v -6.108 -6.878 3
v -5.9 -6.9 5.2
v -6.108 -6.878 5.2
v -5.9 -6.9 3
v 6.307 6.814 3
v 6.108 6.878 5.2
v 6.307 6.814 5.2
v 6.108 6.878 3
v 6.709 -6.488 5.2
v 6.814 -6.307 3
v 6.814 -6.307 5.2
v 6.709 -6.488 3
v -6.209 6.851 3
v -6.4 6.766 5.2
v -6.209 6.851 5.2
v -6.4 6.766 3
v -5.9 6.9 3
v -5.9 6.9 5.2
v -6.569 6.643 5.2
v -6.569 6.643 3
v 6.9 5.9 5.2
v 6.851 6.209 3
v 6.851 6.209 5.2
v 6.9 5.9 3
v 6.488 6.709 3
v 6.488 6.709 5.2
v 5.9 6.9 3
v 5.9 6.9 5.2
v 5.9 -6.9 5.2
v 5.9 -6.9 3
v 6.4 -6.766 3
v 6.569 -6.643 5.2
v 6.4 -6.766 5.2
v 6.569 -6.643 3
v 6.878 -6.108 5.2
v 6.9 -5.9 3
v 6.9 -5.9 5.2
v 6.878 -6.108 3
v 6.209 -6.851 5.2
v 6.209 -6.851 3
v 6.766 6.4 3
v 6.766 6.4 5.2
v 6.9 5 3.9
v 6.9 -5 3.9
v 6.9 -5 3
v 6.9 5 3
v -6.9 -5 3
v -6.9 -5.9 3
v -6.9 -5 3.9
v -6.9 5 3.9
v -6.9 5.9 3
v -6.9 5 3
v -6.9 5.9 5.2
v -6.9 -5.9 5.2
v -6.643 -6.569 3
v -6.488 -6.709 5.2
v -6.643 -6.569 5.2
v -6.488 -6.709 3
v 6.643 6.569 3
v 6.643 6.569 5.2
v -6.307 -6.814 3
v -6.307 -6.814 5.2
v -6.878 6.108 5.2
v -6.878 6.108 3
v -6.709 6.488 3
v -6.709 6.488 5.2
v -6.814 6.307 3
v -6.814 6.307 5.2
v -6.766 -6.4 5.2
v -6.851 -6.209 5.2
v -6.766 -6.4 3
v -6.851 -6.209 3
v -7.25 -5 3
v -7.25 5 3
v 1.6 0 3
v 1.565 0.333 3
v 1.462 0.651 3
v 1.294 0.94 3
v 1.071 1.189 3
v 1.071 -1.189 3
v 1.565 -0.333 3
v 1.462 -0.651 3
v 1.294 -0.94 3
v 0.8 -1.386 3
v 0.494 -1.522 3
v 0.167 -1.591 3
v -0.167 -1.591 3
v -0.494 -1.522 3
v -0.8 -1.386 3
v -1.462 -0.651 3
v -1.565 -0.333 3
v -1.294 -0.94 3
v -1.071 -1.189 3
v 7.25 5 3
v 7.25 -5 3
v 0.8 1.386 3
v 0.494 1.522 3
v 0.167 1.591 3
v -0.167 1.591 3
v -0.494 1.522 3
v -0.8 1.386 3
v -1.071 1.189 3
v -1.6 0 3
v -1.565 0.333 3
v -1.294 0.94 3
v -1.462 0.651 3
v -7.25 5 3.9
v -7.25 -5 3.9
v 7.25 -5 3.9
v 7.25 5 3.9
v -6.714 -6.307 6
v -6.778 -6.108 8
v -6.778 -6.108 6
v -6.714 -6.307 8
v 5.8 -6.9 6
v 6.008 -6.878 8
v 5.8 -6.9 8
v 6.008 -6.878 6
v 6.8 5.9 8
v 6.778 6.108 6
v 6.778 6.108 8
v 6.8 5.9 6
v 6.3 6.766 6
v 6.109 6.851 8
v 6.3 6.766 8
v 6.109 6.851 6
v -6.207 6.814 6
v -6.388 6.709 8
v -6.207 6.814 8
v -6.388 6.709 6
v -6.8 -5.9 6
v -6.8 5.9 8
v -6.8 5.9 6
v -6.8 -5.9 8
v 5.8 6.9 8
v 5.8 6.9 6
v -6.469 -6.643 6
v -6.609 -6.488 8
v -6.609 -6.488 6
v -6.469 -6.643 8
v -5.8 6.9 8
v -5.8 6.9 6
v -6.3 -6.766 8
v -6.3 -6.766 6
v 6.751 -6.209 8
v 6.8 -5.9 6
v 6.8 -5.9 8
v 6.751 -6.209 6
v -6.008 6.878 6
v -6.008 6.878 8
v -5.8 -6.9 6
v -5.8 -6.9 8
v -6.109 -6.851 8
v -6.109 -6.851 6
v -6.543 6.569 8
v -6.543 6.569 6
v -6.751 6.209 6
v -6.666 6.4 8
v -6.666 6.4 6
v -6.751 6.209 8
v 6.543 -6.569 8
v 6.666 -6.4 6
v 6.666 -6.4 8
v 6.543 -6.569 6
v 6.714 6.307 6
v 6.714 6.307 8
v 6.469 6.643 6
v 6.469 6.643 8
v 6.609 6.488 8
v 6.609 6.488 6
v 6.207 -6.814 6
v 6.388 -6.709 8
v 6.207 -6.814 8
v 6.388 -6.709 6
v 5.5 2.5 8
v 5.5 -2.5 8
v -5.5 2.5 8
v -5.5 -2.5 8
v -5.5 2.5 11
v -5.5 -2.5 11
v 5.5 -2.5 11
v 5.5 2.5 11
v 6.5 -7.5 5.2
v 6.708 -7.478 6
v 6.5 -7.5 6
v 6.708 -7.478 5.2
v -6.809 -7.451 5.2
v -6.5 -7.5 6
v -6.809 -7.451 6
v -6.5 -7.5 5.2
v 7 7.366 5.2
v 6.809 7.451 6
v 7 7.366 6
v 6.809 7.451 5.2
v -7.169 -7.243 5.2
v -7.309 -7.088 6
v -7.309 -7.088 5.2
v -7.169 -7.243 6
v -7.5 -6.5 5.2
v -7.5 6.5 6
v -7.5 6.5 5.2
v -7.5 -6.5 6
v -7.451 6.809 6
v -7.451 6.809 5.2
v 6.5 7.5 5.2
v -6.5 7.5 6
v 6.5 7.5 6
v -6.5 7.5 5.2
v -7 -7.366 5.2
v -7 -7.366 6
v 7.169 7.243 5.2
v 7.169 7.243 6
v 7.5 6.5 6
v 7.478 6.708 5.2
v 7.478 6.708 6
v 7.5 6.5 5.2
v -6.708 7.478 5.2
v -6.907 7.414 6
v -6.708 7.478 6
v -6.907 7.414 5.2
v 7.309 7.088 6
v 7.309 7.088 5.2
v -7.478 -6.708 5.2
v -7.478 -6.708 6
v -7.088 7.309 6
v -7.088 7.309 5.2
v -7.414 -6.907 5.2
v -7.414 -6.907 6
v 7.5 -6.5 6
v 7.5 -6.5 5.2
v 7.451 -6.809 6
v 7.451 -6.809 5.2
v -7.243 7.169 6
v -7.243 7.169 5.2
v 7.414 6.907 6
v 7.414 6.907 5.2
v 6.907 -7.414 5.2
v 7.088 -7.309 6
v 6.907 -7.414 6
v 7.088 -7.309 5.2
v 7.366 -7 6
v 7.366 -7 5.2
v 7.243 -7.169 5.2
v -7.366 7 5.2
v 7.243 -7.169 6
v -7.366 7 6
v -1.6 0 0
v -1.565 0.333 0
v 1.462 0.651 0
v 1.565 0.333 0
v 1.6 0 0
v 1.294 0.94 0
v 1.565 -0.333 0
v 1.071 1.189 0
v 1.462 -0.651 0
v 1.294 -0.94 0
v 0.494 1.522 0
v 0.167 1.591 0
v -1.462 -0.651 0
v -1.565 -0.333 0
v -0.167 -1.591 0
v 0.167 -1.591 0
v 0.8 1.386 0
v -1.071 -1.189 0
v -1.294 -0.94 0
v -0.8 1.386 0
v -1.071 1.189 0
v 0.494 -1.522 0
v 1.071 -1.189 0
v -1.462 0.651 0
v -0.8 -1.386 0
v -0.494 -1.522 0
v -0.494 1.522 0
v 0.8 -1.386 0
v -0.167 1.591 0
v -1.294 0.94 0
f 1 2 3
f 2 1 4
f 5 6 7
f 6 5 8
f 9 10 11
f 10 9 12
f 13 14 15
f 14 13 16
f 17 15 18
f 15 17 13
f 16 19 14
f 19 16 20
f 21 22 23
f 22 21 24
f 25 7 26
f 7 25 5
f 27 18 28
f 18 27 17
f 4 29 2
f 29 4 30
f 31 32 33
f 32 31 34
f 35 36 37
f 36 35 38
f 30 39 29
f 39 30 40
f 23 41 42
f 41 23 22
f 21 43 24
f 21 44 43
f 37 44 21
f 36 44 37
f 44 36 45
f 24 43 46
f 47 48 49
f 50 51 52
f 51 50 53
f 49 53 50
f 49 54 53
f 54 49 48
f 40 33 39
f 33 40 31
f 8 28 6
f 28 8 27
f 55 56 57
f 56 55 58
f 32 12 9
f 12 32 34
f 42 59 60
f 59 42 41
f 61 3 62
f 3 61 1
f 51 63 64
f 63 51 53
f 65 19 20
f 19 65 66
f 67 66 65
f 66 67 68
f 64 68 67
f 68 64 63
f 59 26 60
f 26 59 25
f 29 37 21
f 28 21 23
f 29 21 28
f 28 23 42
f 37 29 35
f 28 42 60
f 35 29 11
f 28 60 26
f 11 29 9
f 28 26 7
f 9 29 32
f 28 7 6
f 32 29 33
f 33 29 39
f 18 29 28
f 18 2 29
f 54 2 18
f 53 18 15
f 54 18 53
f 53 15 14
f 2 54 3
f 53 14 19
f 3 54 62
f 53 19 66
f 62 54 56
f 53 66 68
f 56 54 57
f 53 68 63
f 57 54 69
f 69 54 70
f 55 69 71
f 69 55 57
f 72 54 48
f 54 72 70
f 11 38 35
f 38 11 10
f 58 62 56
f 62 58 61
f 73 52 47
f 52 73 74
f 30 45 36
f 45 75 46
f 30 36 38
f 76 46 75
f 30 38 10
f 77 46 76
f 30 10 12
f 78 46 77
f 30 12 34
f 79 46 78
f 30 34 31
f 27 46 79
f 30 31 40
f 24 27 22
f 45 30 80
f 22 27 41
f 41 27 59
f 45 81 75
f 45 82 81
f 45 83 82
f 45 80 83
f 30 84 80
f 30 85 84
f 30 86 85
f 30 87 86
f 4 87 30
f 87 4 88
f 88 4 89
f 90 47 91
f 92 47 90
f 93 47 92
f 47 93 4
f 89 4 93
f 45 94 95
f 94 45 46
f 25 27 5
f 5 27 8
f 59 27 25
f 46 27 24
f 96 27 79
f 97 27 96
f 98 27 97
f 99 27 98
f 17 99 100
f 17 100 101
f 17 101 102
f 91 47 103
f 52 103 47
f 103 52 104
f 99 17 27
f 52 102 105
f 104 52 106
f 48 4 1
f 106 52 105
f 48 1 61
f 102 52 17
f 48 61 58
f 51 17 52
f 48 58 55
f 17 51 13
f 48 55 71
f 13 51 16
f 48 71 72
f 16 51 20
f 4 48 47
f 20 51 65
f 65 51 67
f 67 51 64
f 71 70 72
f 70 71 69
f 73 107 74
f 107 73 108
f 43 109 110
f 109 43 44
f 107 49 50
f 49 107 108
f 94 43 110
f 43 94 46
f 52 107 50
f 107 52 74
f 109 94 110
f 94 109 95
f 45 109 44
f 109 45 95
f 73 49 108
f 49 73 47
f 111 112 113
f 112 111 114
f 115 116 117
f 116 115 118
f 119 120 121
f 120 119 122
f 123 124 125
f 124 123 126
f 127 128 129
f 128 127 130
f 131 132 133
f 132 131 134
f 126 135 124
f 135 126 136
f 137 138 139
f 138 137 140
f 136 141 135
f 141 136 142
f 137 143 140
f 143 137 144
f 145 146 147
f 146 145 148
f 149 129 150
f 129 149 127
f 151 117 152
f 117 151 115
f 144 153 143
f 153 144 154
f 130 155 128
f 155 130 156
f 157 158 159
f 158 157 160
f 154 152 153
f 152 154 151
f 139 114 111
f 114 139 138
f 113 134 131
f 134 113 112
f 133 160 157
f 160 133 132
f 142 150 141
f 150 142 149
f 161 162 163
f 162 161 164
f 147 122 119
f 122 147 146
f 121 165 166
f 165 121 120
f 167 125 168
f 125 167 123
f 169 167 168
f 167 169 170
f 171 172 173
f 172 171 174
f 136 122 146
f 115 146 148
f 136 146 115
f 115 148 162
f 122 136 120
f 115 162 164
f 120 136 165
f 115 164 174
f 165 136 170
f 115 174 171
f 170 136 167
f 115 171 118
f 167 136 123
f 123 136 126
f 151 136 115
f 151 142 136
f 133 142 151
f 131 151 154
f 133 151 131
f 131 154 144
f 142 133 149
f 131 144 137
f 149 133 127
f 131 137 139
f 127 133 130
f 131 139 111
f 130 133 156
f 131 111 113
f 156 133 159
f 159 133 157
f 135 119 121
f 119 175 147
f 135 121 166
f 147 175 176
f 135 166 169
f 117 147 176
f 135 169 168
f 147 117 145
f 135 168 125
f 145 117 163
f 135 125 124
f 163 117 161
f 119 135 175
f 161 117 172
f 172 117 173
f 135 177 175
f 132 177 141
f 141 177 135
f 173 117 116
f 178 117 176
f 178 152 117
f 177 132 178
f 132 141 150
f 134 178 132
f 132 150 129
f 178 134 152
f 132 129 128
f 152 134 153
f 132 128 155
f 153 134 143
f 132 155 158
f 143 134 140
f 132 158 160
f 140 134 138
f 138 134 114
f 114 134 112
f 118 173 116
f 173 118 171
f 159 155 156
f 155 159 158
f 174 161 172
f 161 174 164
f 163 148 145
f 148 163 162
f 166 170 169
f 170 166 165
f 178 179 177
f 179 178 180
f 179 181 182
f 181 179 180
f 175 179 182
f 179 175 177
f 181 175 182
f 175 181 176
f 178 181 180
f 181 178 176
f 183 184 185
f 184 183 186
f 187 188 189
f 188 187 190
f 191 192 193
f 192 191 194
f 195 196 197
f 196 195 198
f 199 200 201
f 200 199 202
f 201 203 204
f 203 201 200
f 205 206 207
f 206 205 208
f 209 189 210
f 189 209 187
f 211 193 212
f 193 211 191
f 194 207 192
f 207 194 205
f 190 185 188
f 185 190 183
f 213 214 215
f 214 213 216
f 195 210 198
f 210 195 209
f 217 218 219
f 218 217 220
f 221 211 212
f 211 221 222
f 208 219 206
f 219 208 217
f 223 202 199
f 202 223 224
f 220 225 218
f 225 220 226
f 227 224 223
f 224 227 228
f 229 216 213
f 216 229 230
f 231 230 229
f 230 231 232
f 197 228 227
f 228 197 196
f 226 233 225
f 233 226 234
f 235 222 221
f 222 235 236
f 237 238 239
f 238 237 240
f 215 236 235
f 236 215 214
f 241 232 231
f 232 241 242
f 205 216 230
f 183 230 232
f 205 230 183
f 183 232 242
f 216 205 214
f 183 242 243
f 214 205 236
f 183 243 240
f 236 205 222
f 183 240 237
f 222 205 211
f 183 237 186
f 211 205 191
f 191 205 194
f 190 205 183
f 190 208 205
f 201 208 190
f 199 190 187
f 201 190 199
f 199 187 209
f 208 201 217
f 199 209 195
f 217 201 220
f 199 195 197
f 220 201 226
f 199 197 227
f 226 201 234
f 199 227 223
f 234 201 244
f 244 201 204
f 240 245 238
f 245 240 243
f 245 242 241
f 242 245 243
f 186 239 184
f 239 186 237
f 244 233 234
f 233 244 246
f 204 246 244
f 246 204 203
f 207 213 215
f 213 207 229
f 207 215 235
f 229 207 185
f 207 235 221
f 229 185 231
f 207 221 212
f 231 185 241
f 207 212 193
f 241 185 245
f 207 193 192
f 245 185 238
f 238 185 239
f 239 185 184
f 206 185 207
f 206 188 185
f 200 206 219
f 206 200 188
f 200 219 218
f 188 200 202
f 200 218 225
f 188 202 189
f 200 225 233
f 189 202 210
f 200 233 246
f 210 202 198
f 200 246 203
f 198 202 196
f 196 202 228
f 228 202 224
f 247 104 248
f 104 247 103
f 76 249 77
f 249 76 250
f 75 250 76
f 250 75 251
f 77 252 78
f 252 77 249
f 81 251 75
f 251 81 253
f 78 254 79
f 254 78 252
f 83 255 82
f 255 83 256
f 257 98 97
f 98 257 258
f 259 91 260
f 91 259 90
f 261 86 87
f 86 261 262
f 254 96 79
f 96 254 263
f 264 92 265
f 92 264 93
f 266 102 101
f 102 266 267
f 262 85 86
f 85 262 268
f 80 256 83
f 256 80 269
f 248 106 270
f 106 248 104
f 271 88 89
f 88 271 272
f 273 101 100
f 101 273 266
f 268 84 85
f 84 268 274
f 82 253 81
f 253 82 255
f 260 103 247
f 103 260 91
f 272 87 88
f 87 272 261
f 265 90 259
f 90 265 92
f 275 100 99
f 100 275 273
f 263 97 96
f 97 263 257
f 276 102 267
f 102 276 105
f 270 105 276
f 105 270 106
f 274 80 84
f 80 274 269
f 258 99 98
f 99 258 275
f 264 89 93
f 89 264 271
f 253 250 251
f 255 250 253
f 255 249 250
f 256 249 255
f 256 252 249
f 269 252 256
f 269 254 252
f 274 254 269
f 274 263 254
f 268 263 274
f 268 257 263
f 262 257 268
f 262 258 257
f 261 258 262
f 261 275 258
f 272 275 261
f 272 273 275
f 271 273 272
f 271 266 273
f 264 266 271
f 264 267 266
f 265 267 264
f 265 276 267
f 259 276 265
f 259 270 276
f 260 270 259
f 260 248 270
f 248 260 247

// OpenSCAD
// ref. http://www.kailh.com/en/Products/Ks/CS/320.html

$fn = 30;
$vpd = 305;
$vpt = [40, 30, 0];
// $vpr = [0, 0, 0];
$vpr = [90, 0, 0];

width = 11.00;  // 大まかな値
height = 5.00;  // 大まかな値
thickness = 3.00;
top_width = 13.60;
top_height = 13.80;
top_thickness = 2.00;

rim_size = 15.00;
rim_thickness = 0.80;

bottom_size = 13.80;
bottom_thickness = 2.20;

slot_thickness = 1.30;

latch_width = 14.50 - bottom_size;
latch_height = 10.0; // 大まかな値
latch_thickness = 0.9;

leg_length = 3.00;
leg_r = 3.20 / 2;


module leg() {
  color("brown", 0.8) {
    cylinder(leg_length, r=leg_r);
  }
}

module bottom_housing() {
  color("brown", 0.8) {
    rotate([0, 180]) translate([0, 0, -bottom_thickness]) {
      linear_extrude(height=bottom_thickness) {
        offset(1) offset(-1) {
          square(size=[bottom_size, bottom_size], center=true);
        }
      }
    }
  }
  // latch
  color("white", 1) linear_extrude(height=latch_thickness) {
    square(size=[latch_width+bottom_size, latch_height], center=true);
  }
}

module rim() {
  color("brown", 0.8) {
    linear_extrude(height=rim_thickness) {
      offset(1) offset(-1) {
        square(size=[rim_size, rim_size], center=true);
      }
    }
  }
}

module top_housing() {
  color("gray", 0.5) {
    linear_extrude(height=top_thickness) {
      offset(1) offset(-1) {
        square(size=[top_width, top_height], center=true);
      }
    }
    // stem
    translate([0, 0, top_thickness]) {
      #linear_extrude(height=thickness) {
        square(size=[width, height], center=true);
      }
    }
  }
}

module switch() {
  leg();
  translate([0, 0, leg_length]) {
    bottom_housing();
    translate([0, 0, bottom_thickness]) {
      rim();
      translate([0, 0, rim_thickness]) {
        top_housing();
      }
    }
  }
}

function switch_top_width() = top_width;
function switch_top_height() = top_height;
function switch_bottom_height() = bottom_size;
function switch_bottom_width() = bottom_size;
function switch_slot_thickness() = slot_thickness;
function switch_latch_thickness() = latch_thickness;
function switch_bottom_thickness() = bottom_thickness;
function switch_leg_length() = leg_length;
function switch_rim_size() = rim_size;


switch();
